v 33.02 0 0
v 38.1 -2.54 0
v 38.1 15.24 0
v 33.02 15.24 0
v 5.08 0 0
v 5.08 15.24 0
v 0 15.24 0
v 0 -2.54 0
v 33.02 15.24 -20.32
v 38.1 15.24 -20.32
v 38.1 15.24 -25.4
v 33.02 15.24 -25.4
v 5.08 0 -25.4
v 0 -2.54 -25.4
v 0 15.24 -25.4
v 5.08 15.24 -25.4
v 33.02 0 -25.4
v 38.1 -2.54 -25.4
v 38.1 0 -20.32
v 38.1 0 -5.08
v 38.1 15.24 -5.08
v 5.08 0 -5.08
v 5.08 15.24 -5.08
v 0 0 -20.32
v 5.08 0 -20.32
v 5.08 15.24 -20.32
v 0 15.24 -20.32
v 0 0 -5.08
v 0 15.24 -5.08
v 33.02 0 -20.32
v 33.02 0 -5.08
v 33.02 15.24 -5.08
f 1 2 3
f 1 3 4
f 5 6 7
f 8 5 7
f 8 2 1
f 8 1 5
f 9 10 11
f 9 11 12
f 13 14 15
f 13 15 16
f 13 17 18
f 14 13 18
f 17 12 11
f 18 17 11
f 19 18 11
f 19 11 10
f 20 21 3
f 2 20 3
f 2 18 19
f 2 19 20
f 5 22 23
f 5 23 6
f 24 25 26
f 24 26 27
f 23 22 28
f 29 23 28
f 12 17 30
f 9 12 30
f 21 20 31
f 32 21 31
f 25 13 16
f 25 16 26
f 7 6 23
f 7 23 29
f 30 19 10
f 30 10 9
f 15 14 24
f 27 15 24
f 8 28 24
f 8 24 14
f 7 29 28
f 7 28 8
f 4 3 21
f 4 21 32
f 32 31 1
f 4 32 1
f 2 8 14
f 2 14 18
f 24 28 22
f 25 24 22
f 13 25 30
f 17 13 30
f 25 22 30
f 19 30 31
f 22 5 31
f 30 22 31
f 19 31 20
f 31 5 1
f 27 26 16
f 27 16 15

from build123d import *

# Parameters (mm, degrees)
F0_W     = 38.1
F0_H     = 25.4
F1_DEPTH = 2.54
F2_W     = 5.08
F2_H     = 5.08
F3_DEPTH = 15.24


with BuildPart() as f1:
    # F0 (on Front) → F1 (new body)
    with BuildSketch(Plane.XZ):
        with Locations((19.05, -12.7)):
            Rectangle(F0_W, F0_H)
    extrude(amount=F1_DEPTH)

    # F2 (on face) → F3 (join)
    with BuildSketch(Plane(origin=(0, 0, 0), x_dir=(-1, 0, 0), z_dir=(0, 1, 0))):
        with Locations((-35.56, -2.54)):
            Rectangle(F2_W, F2_H)
        with Locations((-35.56, -22.86)):
            Rectangle(F2_W, F2_H)
        with Locations((-2.54, -2.54)):
            Rectangle(F2_W, F2_H)
        with Locations((-2.54, -22.86)):
            Rectangle(F2_W, F2_H)
    extrude(amount=F3_DEPTH)


solid = f1.part
